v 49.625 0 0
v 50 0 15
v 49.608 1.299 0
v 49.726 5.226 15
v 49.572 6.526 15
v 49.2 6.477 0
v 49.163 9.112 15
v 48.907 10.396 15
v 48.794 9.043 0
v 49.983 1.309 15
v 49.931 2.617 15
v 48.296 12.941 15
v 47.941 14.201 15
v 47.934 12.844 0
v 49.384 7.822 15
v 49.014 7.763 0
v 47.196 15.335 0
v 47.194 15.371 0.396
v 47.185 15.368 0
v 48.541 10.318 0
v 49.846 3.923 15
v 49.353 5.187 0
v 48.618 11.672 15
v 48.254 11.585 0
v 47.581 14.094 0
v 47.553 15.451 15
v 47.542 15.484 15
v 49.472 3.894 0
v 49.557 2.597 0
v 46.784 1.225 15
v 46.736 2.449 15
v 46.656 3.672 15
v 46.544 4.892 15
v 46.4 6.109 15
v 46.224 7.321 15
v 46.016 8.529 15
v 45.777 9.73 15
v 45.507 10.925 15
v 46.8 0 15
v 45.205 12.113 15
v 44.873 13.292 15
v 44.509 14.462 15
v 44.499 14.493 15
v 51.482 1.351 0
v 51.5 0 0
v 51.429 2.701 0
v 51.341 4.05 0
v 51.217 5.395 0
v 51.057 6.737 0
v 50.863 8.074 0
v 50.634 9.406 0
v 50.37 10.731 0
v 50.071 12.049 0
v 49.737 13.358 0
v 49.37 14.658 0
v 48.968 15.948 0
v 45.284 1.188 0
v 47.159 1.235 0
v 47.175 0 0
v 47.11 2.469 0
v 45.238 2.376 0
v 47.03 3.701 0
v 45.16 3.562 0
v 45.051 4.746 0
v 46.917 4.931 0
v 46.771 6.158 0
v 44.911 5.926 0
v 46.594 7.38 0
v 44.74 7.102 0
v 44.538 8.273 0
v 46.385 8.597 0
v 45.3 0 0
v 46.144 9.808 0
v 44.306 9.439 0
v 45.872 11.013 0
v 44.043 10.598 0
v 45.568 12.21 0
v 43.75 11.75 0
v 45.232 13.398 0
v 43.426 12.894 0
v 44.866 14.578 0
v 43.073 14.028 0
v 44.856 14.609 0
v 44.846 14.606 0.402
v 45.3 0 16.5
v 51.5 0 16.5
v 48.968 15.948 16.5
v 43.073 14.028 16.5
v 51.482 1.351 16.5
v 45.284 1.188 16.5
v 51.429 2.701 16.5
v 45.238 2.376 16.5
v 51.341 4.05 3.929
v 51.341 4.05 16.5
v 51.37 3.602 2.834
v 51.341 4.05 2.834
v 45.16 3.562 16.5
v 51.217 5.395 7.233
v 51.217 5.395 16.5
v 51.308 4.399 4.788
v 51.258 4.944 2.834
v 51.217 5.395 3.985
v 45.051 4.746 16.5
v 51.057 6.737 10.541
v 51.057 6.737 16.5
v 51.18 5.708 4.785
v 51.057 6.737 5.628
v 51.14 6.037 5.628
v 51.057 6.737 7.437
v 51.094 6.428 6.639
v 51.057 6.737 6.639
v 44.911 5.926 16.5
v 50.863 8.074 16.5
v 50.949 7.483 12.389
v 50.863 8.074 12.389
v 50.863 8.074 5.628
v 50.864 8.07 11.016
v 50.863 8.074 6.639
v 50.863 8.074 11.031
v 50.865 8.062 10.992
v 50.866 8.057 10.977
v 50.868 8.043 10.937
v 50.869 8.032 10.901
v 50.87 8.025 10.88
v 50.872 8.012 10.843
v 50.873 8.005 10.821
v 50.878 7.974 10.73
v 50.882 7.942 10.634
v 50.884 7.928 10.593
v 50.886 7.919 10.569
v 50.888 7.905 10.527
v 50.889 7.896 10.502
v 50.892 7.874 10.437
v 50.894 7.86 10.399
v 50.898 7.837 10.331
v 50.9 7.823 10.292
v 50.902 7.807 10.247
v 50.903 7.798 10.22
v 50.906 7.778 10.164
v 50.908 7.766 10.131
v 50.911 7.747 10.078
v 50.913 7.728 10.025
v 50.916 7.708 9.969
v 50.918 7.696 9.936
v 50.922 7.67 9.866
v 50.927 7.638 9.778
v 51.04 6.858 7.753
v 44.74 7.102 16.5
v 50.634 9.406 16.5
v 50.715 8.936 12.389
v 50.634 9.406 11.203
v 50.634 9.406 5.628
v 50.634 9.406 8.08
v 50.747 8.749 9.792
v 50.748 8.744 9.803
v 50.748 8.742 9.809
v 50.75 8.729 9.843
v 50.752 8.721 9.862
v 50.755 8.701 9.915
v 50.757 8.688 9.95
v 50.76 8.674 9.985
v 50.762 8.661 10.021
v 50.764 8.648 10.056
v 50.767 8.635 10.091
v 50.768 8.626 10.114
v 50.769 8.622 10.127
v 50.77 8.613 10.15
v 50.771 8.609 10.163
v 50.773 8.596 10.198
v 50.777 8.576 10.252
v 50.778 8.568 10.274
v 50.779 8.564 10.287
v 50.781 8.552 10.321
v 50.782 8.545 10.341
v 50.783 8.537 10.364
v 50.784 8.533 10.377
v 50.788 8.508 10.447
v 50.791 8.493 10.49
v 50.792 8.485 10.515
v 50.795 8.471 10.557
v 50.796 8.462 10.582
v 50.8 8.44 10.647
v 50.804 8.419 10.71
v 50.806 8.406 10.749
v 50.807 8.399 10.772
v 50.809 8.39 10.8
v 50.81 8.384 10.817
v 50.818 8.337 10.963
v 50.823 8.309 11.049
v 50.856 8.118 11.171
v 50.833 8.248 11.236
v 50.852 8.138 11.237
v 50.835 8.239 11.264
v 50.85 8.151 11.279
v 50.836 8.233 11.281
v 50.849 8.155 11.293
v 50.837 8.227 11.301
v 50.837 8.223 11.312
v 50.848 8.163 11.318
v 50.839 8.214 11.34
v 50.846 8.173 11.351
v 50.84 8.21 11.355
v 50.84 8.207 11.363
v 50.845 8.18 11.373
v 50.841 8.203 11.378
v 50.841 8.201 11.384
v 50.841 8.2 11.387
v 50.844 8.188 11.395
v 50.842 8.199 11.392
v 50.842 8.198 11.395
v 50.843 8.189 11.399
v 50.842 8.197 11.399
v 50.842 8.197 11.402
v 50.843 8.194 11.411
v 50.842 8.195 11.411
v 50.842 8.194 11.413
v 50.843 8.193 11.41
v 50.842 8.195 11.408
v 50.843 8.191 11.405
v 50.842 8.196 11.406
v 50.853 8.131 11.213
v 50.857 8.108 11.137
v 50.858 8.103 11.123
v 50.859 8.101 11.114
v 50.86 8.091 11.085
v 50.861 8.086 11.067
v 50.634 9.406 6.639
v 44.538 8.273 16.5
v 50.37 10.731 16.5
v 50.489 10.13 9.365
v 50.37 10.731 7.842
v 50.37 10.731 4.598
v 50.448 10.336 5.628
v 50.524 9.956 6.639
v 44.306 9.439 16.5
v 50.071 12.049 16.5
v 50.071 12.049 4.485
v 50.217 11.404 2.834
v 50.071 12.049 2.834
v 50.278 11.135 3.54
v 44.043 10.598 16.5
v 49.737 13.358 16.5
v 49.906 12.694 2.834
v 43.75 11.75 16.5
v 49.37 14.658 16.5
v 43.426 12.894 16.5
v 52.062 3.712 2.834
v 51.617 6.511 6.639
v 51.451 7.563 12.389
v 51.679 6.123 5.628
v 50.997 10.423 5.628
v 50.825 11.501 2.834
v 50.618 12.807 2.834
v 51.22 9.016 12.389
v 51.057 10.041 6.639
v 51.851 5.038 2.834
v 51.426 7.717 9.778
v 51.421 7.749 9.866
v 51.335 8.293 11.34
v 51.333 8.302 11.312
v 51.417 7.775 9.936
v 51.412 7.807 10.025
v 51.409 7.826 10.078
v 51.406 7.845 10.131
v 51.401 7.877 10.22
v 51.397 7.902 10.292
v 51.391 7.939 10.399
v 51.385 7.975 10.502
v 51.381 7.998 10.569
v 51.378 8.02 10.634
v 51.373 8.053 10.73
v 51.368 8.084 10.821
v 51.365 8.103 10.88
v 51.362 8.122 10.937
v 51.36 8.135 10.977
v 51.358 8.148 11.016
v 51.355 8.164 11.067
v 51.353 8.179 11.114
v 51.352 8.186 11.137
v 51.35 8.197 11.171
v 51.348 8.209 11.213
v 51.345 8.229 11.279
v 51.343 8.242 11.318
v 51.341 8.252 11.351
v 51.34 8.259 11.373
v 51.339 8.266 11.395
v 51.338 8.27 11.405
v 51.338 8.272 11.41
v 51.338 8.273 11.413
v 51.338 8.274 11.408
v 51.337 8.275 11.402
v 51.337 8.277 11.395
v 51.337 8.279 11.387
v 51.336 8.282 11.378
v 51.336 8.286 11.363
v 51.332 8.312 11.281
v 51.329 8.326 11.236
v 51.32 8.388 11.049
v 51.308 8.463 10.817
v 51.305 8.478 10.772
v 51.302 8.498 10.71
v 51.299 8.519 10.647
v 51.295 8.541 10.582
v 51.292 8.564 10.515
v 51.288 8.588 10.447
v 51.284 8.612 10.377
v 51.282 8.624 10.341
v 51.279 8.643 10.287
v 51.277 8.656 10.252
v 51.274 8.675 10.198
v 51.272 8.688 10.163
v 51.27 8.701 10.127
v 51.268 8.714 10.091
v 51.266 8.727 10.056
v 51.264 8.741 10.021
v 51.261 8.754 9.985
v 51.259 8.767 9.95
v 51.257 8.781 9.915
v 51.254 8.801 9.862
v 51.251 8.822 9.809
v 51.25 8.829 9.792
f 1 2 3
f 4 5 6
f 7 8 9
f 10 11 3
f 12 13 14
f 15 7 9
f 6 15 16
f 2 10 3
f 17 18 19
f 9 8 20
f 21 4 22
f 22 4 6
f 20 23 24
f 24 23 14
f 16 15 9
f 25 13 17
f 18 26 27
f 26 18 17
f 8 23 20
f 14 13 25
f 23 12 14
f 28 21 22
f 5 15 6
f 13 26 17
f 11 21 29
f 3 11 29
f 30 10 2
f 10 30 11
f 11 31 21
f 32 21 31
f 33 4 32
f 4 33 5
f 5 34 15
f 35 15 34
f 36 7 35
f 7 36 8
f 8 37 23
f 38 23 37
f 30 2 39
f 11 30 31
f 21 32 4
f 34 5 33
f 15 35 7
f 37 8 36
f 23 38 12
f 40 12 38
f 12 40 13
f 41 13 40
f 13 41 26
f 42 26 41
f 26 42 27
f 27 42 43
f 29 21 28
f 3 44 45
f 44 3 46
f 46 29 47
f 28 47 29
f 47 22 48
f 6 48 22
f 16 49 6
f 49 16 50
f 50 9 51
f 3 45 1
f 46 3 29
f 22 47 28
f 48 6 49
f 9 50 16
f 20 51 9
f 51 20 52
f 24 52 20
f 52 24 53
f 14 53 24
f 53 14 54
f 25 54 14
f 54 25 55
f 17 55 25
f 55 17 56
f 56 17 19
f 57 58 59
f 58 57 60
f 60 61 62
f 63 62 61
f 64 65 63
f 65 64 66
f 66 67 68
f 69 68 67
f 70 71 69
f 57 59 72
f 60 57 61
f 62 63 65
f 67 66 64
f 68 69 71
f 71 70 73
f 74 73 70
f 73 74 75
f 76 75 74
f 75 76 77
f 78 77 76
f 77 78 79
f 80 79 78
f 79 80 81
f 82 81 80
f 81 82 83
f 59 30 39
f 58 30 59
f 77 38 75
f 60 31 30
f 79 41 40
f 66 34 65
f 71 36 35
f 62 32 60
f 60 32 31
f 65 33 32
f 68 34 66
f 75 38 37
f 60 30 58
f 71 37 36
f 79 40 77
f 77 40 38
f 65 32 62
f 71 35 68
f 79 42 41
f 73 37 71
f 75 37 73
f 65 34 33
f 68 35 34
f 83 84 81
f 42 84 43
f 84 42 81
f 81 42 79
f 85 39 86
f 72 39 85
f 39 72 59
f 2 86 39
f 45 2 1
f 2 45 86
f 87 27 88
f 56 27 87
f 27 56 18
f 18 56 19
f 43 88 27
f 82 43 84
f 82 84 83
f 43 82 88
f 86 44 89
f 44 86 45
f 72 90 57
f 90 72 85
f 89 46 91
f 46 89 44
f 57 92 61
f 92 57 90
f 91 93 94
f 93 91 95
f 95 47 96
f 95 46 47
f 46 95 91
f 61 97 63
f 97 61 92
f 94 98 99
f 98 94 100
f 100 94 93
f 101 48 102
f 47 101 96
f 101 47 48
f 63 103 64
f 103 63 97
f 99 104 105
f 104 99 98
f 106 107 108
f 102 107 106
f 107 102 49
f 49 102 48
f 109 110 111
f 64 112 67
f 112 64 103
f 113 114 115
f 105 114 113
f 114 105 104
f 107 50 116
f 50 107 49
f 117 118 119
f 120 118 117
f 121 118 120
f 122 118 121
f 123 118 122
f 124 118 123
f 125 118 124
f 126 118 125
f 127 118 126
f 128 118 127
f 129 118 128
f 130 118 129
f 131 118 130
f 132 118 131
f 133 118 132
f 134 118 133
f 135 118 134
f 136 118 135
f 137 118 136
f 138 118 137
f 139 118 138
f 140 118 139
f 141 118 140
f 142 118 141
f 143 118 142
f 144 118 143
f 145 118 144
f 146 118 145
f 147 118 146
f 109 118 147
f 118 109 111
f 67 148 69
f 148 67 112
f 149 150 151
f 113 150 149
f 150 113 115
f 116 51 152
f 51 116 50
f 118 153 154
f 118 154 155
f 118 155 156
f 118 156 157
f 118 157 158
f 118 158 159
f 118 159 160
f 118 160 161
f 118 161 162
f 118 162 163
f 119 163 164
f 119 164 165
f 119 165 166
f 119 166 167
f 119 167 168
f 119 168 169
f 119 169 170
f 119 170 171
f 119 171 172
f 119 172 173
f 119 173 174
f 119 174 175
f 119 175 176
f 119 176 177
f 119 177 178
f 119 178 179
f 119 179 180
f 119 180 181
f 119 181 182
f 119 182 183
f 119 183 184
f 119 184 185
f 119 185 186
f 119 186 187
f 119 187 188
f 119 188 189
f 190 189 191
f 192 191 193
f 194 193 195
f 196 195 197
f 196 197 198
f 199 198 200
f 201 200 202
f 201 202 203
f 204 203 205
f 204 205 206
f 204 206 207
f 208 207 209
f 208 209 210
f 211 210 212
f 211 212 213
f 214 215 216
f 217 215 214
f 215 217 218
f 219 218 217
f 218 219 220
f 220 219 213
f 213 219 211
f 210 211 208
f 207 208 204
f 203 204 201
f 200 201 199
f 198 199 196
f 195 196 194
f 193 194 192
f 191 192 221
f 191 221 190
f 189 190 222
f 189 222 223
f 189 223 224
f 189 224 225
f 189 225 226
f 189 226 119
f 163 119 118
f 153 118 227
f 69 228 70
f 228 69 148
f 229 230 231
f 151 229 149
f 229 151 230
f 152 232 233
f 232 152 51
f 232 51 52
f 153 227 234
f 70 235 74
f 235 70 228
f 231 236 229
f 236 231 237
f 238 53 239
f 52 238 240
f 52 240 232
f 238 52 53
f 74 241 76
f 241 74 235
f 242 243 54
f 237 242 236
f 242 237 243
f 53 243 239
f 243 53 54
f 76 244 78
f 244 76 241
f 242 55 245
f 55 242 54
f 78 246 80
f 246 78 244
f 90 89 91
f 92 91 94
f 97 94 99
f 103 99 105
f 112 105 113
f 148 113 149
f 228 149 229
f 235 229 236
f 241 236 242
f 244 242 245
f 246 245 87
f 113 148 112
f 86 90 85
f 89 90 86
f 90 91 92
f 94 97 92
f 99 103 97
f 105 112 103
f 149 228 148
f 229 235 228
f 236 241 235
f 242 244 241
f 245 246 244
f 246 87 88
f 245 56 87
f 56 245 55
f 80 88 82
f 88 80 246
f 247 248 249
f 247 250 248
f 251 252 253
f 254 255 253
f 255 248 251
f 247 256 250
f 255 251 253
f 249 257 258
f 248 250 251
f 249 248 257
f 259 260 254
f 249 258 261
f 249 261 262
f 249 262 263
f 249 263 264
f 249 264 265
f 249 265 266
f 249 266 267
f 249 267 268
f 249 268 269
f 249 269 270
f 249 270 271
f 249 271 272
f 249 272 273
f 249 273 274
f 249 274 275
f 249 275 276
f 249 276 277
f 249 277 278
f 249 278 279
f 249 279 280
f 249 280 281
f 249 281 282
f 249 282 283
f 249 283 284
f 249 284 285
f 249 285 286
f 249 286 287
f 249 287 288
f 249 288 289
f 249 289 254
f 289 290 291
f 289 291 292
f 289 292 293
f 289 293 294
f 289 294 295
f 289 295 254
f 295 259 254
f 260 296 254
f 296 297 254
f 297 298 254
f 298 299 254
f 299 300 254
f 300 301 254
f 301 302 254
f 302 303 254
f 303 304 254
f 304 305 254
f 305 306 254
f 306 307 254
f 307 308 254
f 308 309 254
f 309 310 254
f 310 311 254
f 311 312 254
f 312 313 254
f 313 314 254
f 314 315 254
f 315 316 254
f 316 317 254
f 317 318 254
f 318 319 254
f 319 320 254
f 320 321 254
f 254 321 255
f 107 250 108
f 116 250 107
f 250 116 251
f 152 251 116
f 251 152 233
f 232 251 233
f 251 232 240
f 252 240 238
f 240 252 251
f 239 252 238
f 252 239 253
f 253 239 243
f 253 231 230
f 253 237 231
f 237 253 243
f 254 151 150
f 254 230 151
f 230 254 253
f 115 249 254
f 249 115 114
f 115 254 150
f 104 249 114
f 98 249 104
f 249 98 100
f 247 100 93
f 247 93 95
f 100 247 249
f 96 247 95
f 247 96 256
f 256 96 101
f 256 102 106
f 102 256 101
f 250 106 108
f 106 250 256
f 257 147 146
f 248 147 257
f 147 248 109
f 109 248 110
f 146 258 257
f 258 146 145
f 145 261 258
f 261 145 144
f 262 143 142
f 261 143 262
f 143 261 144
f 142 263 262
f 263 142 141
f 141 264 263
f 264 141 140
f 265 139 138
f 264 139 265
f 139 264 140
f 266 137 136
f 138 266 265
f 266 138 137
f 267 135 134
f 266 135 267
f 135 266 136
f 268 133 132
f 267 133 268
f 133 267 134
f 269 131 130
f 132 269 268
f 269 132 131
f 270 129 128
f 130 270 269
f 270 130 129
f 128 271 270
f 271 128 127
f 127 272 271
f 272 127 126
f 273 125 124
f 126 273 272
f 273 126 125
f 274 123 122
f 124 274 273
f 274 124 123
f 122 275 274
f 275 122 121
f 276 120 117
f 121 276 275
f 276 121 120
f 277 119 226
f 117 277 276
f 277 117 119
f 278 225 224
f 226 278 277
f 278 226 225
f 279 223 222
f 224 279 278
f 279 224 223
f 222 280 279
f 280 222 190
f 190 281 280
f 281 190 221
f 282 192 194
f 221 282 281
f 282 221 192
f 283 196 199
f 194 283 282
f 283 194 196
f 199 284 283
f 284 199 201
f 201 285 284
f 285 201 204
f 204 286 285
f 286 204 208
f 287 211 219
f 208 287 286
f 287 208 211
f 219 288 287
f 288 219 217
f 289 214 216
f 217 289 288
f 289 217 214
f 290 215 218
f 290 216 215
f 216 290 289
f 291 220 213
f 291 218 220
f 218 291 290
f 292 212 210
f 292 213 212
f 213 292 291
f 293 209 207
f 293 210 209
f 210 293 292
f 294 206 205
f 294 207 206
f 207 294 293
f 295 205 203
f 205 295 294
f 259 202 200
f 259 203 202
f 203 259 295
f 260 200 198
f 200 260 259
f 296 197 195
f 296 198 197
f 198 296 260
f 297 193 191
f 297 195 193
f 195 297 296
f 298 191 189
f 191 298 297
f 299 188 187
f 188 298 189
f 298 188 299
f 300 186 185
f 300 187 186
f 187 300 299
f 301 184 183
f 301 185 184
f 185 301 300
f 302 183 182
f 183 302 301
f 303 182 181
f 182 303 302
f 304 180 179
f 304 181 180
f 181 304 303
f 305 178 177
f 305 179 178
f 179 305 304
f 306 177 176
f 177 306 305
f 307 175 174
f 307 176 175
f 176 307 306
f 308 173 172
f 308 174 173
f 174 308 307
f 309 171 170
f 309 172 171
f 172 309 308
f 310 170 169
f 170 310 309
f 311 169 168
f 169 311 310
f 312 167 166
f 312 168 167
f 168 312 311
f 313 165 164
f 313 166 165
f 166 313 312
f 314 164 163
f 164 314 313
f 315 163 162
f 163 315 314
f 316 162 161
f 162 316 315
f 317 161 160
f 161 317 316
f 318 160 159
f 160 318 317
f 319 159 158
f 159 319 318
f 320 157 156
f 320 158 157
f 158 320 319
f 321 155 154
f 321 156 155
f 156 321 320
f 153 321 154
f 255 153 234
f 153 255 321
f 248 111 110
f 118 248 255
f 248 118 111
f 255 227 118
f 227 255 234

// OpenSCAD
$fn=240;
glas_diameter=100;
glas_thickness=3.2;

width=15;
height=15;
thickness=1.5;
clamp=1.5;

winkel=width*360/3.141/(glas_diameter-thickness-glas_thickness);

difference() {
rotate_extrude(angle=winkel) translate([(glas_diameter-2*thickness-2*glas_thickness)/2,0]) square([2*thickness+glas_thickness,height+thickness]);

difference() {
cylinder(d1=glas_diameter-clamp/2,d2=glas_diameter,h=height);
cylinder(d1=glas_diameter+clamp/2-2*glas_thickness,d2=glas_diameter-2*glas_thickness,h=height);
}
}

translate([0,0,height/2]) rotate([0,0,winkel/2]) translate([glas_diameter/2+thickness-.3,0,0]) rotate([90,0,90]) linear_extrude(0.8) text("A", halign="center", valign="center");
